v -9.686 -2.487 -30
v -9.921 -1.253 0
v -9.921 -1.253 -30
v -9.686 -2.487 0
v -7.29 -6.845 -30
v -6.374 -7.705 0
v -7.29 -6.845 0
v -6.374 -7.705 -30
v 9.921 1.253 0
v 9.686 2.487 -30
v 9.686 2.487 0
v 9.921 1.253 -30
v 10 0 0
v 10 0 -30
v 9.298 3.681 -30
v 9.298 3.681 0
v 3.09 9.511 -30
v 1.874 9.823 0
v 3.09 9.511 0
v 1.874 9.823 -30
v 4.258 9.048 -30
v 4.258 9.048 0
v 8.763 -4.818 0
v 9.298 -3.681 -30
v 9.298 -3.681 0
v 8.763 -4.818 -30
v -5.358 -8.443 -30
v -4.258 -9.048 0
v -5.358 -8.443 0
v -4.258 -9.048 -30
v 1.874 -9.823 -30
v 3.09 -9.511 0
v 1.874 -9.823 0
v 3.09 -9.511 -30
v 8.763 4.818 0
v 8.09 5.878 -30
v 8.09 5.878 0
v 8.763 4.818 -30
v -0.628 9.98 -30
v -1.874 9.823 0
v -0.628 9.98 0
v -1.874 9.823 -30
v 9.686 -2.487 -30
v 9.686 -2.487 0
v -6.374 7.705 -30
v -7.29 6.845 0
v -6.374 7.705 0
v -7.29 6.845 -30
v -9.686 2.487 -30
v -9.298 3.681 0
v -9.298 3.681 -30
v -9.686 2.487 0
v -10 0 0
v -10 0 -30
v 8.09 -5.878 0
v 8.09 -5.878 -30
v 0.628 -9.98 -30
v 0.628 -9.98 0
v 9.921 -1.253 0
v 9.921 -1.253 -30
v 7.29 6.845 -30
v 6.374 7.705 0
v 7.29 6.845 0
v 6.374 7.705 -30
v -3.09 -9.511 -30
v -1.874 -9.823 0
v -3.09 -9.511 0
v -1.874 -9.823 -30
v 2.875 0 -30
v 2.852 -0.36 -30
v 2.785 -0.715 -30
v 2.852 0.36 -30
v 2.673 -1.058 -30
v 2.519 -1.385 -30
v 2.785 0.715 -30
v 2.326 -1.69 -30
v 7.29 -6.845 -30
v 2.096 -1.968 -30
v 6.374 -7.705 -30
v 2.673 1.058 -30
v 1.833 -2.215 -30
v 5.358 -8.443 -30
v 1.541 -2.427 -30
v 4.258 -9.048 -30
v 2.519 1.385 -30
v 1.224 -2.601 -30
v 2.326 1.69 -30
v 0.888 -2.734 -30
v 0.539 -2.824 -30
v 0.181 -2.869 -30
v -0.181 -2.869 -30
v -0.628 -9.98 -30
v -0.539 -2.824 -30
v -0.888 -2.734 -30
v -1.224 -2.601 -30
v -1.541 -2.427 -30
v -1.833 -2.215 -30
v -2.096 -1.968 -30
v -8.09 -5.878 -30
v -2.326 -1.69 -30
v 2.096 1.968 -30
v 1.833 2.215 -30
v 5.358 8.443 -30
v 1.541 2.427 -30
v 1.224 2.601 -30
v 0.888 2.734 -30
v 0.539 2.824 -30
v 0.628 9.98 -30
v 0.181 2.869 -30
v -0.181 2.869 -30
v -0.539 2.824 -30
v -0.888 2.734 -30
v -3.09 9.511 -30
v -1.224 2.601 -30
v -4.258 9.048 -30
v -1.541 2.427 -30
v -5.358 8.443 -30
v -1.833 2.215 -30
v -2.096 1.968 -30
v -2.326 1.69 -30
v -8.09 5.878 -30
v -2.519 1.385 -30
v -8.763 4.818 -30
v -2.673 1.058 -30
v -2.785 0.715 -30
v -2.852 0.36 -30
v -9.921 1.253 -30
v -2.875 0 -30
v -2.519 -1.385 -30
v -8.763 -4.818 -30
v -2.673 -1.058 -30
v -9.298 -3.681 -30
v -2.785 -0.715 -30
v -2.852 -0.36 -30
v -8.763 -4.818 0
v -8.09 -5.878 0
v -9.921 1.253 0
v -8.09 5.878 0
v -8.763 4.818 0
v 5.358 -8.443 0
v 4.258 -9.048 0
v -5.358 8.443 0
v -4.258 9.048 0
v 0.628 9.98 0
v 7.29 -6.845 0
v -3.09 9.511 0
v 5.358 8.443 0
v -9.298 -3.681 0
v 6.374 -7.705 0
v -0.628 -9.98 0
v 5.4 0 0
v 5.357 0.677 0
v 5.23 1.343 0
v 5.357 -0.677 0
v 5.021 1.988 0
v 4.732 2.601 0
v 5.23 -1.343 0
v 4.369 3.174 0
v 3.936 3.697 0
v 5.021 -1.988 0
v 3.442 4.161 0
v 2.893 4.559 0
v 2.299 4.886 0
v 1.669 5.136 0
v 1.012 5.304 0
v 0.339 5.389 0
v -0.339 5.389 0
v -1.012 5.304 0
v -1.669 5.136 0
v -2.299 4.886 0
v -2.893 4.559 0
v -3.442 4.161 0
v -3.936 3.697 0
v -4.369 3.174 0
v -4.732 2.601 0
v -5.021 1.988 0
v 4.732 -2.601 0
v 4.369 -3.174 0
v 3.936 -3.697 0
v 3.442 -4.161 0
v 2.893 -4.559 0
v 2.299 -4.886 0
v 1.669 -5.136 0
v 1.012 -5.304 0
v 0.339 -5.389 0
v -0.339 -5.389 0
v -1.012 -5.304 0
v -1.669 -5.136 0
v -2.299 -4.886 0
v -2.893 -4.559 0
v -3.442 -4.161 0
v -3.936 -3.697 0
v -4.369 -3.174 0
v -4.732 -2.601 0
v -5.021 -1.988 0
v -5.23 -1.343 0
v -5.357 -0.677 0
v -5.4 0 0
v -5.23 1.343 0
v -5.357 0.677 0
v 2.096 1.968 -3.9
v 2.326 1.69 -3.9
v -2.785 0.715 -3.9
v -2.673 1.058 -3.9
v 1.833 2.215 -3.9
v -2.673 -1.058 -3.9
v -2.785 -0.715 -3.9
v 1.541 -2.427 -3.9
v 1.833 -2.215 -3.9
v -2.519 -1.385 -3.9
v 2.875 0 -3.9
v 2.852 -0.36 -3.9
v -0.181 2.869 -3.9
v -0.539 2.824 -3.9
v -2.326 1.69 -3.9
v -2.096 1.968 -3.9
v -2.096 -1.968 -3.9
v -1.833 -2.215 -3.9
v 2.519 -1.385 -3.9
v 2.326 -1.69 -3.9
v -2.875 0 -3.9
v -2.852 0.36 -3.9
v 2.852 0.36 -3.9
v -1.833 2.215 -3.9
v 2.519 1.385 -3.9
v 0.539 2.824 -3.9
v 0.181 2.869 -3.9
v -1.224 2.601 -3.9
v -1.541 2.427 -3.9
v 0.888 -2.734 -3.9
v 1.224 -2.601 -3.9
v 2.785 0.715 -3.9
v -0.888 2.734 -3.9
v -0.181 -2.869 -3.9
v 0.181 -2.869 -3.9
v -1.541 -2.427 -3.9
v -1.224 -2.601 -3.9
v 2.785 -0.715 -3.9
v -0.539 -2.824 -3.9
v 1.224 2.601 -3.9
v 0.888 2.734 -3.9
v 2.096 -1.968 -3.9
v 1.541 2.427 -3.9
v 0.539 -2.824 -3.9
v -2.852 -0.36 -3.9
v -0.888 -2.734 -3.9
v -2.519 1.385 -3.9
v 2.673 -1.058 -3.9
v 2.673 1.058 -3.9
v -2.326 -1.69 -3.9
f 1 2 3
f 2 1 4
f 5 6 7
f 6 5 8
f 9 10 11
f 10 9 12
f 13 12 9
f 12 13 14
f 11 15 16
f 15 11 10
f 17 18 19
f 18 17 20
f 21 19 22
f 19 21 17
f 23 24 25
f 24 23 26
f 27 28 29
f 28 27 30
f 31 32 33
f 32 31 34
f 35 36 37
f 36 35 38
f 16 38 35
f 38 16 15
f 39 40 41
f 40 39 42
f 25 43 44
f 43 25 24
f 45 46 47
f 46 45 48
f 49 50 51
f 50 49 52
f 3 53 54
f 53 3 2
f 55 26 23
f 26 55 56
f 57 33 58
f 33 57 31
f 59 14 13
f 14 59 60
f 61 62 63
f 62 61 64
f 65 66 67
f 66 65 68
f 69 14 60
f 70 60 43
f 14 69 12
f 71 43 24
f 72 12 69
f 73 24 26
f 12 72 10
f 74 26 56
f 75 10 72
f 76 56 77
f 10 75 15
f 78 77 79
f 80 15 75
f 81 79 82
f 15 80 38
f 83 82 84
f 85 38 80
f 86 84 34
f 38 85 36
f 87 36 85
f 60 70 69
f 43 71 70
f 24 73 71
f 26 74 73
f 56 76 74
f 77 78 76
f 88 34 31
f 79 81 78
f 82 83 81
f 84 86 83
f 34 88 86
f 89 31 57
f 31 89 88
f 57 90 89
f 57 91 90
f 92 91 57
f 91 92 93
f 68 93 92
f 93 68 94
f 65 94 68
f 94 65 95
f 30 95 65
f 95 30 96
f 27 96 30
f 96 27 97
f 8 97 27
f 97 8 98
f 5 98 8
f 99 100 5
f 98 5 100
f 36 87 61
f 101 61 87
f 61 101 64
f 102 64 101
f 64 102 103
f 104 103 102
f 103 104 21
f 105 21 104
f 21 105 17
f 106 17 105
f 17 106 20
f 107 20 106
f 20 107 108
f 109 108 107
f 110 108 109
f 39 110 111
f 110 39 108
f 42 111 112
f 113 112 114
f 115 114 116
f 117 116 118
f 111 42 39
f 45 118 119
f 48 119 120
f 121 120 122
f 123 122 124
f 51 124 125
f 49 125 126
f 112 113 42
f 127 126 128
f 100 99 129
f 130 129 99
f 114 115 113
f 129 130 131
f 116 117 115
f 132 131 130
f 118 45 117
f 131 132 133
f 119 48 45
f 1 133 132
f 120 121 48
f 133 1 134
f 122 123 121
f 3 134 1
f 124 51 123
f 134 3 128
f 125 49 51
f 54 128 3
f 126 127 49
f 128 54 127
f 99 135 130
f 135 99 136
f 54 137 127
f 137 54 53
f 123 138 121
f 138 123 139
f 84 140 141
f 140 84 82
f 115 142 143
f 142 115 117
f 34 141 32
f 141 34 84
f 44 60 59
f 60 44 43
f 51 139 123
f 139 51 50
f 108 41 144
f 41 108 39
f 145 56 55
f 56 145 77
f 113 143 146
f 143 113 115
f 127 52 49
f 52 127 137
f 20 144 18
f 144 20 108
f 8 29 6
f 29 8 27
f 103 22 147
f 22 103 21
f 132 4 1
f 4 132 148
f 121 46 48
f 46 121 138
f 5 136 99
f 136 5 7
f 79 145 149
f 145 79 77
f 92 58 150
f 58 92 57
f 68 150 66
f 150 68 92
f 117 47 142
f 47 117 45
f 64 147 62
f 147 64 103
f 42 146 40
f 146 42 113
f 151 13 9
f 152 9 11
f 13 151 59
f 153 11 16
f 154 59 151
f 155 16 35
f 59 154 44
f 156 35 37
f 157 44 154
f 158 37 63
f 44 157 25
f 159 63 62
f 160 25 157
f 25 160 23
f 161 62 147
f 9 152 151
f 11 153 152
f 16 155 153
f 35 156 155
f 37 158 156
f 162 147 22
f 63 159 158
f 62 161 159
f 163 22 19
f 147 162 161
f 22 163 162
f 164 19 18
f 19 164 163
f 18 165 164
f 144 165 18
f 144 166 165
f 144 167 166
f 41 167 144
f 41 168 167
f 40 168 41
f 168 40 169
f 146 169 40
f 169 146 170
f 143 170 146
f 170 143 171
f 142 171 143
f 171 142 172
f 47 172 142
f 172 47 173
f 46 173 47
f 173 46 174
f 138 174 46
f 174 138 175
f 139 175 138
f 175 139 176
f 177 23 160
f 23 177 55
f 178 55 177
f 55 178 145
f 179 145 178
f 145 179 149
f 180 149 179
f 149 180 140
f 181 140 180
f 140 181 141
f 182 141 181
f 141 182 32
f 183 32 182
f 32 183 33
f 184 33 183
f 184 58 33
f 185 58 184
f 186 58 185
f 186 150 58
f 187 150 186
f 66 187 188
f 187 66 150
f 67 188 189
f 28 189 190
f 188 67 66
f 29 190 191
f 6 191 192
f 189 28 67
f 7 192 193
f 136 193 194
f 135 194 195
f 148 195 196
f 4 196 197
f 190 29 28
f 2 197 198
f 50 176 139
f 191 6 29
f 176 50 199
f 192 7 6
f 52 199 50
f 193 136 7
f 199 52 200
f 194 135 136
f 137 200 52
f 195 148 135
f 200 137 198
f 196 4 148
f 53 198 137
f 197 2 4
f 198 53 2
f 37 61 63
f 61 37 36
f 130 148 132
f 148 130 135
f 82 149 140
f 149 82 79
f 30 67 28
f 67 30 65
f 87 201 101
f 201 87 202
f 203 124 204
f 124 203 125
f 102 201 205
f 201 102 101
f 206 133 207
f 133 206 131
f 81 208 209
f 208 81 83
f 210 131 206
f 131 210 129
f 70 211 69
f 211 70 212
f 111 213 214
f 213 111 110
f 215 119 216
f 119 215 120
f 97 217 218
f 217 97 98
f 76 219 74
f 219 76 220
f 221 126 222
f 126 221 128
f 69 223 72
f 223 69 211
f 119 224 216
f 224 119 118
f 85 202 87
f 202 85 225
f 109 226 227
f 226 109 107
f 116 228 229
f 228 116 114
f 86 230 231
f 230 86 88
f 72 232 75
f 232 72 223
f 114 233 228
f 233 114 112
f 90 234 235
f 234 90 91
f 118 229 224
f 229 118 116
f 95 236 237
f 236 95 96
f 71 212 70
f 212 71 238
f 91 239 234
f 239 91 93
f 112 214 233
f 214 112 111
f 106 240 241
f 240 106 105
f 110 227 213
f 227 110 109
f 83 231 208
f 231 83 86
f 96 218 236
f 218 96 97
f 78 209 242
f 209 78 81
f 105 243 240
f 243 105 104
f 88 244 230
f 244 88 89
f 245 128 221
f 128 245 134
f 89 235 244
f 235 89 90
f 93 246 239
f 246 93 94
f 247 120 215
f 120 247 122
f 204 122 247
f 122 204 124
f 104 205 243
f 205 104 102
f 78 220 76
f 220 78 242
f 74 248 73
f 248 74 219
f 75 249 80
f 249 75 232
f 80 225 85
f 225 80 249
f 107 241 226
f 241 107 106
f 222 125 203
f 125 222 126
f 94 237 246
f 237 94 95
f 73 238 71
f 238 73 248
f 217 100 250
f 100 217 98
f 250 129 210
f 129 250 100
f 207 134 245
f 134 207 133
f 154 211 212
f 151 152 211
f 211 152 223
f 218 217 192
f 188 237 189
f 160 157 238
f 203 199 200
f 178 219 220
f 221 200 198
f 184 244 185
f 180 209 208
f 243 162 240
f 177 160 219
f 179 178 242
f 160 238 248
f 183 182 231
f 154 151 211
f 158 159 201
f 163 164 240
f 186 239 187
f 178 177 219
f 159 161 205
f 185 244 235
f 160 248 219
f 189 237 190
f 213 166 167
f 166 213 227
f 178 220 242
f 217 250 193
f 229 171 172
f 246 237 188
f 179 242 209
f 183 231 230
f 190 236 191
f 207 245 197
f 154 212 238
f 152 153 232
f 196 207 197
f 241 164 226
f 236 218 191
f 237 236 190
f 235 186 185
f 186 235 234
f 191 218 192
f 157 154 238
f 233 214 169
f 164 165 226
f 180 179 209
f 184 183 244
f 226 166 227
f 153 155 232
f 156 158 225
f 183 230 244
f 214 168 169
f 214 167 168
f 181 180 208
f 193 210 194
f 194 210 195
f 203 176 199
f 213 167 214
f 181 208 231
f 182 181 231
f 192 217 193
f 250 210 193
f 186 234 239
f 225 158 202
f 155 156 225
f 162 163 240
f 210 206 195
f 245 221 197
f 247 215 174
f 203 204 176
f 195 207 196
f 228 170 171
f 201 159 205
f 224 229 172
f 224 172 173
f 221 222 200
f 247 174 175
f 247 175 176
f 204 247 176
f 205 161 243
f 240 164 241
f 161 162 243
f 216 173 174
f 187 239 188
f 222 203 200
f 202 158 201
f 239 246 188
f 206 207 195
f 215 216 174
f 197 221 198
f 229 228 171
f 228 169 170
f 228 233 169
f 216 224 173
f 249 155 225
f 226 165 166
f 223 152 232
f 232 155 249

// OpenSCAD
$fn = 50;


difference() {
	union() {
		translate(v = [0, 0, -30.0000000000]) {
			cylinder(h = 30, r = 10.0000000000);
		}
		#translate(v = [0, 0, -33.0000000000]) {
			cylinder(h = 33, r = 2.8750000000);
		}
	}
	union() {
		translate(v = [0, 0, 0]) {
			rotate(a = [0, 0, 0]) {
				difference() {
					union() {
						translate(v = [0, 0, -33.0000000000]) {
							cylinder(h = 33, r = 2.6000000000);
						}
						translate(v = [0, 0, -3.9000000000]) {
							cylinder(h = 3.9000000000, r1 = 2.8750000000, r2 = 5.4000000000);
						}
						translate(v = [0, 0, -33.0000000000]) {
							cylinder(h = 33, r = 2.8750000000);
						}
						translate(v = [0, 0, -33.0000000000]) {
							cylinder(h = 33, r = 2.6000000000);
						}
					}
					union();
				}
			}
		}
	}
}
